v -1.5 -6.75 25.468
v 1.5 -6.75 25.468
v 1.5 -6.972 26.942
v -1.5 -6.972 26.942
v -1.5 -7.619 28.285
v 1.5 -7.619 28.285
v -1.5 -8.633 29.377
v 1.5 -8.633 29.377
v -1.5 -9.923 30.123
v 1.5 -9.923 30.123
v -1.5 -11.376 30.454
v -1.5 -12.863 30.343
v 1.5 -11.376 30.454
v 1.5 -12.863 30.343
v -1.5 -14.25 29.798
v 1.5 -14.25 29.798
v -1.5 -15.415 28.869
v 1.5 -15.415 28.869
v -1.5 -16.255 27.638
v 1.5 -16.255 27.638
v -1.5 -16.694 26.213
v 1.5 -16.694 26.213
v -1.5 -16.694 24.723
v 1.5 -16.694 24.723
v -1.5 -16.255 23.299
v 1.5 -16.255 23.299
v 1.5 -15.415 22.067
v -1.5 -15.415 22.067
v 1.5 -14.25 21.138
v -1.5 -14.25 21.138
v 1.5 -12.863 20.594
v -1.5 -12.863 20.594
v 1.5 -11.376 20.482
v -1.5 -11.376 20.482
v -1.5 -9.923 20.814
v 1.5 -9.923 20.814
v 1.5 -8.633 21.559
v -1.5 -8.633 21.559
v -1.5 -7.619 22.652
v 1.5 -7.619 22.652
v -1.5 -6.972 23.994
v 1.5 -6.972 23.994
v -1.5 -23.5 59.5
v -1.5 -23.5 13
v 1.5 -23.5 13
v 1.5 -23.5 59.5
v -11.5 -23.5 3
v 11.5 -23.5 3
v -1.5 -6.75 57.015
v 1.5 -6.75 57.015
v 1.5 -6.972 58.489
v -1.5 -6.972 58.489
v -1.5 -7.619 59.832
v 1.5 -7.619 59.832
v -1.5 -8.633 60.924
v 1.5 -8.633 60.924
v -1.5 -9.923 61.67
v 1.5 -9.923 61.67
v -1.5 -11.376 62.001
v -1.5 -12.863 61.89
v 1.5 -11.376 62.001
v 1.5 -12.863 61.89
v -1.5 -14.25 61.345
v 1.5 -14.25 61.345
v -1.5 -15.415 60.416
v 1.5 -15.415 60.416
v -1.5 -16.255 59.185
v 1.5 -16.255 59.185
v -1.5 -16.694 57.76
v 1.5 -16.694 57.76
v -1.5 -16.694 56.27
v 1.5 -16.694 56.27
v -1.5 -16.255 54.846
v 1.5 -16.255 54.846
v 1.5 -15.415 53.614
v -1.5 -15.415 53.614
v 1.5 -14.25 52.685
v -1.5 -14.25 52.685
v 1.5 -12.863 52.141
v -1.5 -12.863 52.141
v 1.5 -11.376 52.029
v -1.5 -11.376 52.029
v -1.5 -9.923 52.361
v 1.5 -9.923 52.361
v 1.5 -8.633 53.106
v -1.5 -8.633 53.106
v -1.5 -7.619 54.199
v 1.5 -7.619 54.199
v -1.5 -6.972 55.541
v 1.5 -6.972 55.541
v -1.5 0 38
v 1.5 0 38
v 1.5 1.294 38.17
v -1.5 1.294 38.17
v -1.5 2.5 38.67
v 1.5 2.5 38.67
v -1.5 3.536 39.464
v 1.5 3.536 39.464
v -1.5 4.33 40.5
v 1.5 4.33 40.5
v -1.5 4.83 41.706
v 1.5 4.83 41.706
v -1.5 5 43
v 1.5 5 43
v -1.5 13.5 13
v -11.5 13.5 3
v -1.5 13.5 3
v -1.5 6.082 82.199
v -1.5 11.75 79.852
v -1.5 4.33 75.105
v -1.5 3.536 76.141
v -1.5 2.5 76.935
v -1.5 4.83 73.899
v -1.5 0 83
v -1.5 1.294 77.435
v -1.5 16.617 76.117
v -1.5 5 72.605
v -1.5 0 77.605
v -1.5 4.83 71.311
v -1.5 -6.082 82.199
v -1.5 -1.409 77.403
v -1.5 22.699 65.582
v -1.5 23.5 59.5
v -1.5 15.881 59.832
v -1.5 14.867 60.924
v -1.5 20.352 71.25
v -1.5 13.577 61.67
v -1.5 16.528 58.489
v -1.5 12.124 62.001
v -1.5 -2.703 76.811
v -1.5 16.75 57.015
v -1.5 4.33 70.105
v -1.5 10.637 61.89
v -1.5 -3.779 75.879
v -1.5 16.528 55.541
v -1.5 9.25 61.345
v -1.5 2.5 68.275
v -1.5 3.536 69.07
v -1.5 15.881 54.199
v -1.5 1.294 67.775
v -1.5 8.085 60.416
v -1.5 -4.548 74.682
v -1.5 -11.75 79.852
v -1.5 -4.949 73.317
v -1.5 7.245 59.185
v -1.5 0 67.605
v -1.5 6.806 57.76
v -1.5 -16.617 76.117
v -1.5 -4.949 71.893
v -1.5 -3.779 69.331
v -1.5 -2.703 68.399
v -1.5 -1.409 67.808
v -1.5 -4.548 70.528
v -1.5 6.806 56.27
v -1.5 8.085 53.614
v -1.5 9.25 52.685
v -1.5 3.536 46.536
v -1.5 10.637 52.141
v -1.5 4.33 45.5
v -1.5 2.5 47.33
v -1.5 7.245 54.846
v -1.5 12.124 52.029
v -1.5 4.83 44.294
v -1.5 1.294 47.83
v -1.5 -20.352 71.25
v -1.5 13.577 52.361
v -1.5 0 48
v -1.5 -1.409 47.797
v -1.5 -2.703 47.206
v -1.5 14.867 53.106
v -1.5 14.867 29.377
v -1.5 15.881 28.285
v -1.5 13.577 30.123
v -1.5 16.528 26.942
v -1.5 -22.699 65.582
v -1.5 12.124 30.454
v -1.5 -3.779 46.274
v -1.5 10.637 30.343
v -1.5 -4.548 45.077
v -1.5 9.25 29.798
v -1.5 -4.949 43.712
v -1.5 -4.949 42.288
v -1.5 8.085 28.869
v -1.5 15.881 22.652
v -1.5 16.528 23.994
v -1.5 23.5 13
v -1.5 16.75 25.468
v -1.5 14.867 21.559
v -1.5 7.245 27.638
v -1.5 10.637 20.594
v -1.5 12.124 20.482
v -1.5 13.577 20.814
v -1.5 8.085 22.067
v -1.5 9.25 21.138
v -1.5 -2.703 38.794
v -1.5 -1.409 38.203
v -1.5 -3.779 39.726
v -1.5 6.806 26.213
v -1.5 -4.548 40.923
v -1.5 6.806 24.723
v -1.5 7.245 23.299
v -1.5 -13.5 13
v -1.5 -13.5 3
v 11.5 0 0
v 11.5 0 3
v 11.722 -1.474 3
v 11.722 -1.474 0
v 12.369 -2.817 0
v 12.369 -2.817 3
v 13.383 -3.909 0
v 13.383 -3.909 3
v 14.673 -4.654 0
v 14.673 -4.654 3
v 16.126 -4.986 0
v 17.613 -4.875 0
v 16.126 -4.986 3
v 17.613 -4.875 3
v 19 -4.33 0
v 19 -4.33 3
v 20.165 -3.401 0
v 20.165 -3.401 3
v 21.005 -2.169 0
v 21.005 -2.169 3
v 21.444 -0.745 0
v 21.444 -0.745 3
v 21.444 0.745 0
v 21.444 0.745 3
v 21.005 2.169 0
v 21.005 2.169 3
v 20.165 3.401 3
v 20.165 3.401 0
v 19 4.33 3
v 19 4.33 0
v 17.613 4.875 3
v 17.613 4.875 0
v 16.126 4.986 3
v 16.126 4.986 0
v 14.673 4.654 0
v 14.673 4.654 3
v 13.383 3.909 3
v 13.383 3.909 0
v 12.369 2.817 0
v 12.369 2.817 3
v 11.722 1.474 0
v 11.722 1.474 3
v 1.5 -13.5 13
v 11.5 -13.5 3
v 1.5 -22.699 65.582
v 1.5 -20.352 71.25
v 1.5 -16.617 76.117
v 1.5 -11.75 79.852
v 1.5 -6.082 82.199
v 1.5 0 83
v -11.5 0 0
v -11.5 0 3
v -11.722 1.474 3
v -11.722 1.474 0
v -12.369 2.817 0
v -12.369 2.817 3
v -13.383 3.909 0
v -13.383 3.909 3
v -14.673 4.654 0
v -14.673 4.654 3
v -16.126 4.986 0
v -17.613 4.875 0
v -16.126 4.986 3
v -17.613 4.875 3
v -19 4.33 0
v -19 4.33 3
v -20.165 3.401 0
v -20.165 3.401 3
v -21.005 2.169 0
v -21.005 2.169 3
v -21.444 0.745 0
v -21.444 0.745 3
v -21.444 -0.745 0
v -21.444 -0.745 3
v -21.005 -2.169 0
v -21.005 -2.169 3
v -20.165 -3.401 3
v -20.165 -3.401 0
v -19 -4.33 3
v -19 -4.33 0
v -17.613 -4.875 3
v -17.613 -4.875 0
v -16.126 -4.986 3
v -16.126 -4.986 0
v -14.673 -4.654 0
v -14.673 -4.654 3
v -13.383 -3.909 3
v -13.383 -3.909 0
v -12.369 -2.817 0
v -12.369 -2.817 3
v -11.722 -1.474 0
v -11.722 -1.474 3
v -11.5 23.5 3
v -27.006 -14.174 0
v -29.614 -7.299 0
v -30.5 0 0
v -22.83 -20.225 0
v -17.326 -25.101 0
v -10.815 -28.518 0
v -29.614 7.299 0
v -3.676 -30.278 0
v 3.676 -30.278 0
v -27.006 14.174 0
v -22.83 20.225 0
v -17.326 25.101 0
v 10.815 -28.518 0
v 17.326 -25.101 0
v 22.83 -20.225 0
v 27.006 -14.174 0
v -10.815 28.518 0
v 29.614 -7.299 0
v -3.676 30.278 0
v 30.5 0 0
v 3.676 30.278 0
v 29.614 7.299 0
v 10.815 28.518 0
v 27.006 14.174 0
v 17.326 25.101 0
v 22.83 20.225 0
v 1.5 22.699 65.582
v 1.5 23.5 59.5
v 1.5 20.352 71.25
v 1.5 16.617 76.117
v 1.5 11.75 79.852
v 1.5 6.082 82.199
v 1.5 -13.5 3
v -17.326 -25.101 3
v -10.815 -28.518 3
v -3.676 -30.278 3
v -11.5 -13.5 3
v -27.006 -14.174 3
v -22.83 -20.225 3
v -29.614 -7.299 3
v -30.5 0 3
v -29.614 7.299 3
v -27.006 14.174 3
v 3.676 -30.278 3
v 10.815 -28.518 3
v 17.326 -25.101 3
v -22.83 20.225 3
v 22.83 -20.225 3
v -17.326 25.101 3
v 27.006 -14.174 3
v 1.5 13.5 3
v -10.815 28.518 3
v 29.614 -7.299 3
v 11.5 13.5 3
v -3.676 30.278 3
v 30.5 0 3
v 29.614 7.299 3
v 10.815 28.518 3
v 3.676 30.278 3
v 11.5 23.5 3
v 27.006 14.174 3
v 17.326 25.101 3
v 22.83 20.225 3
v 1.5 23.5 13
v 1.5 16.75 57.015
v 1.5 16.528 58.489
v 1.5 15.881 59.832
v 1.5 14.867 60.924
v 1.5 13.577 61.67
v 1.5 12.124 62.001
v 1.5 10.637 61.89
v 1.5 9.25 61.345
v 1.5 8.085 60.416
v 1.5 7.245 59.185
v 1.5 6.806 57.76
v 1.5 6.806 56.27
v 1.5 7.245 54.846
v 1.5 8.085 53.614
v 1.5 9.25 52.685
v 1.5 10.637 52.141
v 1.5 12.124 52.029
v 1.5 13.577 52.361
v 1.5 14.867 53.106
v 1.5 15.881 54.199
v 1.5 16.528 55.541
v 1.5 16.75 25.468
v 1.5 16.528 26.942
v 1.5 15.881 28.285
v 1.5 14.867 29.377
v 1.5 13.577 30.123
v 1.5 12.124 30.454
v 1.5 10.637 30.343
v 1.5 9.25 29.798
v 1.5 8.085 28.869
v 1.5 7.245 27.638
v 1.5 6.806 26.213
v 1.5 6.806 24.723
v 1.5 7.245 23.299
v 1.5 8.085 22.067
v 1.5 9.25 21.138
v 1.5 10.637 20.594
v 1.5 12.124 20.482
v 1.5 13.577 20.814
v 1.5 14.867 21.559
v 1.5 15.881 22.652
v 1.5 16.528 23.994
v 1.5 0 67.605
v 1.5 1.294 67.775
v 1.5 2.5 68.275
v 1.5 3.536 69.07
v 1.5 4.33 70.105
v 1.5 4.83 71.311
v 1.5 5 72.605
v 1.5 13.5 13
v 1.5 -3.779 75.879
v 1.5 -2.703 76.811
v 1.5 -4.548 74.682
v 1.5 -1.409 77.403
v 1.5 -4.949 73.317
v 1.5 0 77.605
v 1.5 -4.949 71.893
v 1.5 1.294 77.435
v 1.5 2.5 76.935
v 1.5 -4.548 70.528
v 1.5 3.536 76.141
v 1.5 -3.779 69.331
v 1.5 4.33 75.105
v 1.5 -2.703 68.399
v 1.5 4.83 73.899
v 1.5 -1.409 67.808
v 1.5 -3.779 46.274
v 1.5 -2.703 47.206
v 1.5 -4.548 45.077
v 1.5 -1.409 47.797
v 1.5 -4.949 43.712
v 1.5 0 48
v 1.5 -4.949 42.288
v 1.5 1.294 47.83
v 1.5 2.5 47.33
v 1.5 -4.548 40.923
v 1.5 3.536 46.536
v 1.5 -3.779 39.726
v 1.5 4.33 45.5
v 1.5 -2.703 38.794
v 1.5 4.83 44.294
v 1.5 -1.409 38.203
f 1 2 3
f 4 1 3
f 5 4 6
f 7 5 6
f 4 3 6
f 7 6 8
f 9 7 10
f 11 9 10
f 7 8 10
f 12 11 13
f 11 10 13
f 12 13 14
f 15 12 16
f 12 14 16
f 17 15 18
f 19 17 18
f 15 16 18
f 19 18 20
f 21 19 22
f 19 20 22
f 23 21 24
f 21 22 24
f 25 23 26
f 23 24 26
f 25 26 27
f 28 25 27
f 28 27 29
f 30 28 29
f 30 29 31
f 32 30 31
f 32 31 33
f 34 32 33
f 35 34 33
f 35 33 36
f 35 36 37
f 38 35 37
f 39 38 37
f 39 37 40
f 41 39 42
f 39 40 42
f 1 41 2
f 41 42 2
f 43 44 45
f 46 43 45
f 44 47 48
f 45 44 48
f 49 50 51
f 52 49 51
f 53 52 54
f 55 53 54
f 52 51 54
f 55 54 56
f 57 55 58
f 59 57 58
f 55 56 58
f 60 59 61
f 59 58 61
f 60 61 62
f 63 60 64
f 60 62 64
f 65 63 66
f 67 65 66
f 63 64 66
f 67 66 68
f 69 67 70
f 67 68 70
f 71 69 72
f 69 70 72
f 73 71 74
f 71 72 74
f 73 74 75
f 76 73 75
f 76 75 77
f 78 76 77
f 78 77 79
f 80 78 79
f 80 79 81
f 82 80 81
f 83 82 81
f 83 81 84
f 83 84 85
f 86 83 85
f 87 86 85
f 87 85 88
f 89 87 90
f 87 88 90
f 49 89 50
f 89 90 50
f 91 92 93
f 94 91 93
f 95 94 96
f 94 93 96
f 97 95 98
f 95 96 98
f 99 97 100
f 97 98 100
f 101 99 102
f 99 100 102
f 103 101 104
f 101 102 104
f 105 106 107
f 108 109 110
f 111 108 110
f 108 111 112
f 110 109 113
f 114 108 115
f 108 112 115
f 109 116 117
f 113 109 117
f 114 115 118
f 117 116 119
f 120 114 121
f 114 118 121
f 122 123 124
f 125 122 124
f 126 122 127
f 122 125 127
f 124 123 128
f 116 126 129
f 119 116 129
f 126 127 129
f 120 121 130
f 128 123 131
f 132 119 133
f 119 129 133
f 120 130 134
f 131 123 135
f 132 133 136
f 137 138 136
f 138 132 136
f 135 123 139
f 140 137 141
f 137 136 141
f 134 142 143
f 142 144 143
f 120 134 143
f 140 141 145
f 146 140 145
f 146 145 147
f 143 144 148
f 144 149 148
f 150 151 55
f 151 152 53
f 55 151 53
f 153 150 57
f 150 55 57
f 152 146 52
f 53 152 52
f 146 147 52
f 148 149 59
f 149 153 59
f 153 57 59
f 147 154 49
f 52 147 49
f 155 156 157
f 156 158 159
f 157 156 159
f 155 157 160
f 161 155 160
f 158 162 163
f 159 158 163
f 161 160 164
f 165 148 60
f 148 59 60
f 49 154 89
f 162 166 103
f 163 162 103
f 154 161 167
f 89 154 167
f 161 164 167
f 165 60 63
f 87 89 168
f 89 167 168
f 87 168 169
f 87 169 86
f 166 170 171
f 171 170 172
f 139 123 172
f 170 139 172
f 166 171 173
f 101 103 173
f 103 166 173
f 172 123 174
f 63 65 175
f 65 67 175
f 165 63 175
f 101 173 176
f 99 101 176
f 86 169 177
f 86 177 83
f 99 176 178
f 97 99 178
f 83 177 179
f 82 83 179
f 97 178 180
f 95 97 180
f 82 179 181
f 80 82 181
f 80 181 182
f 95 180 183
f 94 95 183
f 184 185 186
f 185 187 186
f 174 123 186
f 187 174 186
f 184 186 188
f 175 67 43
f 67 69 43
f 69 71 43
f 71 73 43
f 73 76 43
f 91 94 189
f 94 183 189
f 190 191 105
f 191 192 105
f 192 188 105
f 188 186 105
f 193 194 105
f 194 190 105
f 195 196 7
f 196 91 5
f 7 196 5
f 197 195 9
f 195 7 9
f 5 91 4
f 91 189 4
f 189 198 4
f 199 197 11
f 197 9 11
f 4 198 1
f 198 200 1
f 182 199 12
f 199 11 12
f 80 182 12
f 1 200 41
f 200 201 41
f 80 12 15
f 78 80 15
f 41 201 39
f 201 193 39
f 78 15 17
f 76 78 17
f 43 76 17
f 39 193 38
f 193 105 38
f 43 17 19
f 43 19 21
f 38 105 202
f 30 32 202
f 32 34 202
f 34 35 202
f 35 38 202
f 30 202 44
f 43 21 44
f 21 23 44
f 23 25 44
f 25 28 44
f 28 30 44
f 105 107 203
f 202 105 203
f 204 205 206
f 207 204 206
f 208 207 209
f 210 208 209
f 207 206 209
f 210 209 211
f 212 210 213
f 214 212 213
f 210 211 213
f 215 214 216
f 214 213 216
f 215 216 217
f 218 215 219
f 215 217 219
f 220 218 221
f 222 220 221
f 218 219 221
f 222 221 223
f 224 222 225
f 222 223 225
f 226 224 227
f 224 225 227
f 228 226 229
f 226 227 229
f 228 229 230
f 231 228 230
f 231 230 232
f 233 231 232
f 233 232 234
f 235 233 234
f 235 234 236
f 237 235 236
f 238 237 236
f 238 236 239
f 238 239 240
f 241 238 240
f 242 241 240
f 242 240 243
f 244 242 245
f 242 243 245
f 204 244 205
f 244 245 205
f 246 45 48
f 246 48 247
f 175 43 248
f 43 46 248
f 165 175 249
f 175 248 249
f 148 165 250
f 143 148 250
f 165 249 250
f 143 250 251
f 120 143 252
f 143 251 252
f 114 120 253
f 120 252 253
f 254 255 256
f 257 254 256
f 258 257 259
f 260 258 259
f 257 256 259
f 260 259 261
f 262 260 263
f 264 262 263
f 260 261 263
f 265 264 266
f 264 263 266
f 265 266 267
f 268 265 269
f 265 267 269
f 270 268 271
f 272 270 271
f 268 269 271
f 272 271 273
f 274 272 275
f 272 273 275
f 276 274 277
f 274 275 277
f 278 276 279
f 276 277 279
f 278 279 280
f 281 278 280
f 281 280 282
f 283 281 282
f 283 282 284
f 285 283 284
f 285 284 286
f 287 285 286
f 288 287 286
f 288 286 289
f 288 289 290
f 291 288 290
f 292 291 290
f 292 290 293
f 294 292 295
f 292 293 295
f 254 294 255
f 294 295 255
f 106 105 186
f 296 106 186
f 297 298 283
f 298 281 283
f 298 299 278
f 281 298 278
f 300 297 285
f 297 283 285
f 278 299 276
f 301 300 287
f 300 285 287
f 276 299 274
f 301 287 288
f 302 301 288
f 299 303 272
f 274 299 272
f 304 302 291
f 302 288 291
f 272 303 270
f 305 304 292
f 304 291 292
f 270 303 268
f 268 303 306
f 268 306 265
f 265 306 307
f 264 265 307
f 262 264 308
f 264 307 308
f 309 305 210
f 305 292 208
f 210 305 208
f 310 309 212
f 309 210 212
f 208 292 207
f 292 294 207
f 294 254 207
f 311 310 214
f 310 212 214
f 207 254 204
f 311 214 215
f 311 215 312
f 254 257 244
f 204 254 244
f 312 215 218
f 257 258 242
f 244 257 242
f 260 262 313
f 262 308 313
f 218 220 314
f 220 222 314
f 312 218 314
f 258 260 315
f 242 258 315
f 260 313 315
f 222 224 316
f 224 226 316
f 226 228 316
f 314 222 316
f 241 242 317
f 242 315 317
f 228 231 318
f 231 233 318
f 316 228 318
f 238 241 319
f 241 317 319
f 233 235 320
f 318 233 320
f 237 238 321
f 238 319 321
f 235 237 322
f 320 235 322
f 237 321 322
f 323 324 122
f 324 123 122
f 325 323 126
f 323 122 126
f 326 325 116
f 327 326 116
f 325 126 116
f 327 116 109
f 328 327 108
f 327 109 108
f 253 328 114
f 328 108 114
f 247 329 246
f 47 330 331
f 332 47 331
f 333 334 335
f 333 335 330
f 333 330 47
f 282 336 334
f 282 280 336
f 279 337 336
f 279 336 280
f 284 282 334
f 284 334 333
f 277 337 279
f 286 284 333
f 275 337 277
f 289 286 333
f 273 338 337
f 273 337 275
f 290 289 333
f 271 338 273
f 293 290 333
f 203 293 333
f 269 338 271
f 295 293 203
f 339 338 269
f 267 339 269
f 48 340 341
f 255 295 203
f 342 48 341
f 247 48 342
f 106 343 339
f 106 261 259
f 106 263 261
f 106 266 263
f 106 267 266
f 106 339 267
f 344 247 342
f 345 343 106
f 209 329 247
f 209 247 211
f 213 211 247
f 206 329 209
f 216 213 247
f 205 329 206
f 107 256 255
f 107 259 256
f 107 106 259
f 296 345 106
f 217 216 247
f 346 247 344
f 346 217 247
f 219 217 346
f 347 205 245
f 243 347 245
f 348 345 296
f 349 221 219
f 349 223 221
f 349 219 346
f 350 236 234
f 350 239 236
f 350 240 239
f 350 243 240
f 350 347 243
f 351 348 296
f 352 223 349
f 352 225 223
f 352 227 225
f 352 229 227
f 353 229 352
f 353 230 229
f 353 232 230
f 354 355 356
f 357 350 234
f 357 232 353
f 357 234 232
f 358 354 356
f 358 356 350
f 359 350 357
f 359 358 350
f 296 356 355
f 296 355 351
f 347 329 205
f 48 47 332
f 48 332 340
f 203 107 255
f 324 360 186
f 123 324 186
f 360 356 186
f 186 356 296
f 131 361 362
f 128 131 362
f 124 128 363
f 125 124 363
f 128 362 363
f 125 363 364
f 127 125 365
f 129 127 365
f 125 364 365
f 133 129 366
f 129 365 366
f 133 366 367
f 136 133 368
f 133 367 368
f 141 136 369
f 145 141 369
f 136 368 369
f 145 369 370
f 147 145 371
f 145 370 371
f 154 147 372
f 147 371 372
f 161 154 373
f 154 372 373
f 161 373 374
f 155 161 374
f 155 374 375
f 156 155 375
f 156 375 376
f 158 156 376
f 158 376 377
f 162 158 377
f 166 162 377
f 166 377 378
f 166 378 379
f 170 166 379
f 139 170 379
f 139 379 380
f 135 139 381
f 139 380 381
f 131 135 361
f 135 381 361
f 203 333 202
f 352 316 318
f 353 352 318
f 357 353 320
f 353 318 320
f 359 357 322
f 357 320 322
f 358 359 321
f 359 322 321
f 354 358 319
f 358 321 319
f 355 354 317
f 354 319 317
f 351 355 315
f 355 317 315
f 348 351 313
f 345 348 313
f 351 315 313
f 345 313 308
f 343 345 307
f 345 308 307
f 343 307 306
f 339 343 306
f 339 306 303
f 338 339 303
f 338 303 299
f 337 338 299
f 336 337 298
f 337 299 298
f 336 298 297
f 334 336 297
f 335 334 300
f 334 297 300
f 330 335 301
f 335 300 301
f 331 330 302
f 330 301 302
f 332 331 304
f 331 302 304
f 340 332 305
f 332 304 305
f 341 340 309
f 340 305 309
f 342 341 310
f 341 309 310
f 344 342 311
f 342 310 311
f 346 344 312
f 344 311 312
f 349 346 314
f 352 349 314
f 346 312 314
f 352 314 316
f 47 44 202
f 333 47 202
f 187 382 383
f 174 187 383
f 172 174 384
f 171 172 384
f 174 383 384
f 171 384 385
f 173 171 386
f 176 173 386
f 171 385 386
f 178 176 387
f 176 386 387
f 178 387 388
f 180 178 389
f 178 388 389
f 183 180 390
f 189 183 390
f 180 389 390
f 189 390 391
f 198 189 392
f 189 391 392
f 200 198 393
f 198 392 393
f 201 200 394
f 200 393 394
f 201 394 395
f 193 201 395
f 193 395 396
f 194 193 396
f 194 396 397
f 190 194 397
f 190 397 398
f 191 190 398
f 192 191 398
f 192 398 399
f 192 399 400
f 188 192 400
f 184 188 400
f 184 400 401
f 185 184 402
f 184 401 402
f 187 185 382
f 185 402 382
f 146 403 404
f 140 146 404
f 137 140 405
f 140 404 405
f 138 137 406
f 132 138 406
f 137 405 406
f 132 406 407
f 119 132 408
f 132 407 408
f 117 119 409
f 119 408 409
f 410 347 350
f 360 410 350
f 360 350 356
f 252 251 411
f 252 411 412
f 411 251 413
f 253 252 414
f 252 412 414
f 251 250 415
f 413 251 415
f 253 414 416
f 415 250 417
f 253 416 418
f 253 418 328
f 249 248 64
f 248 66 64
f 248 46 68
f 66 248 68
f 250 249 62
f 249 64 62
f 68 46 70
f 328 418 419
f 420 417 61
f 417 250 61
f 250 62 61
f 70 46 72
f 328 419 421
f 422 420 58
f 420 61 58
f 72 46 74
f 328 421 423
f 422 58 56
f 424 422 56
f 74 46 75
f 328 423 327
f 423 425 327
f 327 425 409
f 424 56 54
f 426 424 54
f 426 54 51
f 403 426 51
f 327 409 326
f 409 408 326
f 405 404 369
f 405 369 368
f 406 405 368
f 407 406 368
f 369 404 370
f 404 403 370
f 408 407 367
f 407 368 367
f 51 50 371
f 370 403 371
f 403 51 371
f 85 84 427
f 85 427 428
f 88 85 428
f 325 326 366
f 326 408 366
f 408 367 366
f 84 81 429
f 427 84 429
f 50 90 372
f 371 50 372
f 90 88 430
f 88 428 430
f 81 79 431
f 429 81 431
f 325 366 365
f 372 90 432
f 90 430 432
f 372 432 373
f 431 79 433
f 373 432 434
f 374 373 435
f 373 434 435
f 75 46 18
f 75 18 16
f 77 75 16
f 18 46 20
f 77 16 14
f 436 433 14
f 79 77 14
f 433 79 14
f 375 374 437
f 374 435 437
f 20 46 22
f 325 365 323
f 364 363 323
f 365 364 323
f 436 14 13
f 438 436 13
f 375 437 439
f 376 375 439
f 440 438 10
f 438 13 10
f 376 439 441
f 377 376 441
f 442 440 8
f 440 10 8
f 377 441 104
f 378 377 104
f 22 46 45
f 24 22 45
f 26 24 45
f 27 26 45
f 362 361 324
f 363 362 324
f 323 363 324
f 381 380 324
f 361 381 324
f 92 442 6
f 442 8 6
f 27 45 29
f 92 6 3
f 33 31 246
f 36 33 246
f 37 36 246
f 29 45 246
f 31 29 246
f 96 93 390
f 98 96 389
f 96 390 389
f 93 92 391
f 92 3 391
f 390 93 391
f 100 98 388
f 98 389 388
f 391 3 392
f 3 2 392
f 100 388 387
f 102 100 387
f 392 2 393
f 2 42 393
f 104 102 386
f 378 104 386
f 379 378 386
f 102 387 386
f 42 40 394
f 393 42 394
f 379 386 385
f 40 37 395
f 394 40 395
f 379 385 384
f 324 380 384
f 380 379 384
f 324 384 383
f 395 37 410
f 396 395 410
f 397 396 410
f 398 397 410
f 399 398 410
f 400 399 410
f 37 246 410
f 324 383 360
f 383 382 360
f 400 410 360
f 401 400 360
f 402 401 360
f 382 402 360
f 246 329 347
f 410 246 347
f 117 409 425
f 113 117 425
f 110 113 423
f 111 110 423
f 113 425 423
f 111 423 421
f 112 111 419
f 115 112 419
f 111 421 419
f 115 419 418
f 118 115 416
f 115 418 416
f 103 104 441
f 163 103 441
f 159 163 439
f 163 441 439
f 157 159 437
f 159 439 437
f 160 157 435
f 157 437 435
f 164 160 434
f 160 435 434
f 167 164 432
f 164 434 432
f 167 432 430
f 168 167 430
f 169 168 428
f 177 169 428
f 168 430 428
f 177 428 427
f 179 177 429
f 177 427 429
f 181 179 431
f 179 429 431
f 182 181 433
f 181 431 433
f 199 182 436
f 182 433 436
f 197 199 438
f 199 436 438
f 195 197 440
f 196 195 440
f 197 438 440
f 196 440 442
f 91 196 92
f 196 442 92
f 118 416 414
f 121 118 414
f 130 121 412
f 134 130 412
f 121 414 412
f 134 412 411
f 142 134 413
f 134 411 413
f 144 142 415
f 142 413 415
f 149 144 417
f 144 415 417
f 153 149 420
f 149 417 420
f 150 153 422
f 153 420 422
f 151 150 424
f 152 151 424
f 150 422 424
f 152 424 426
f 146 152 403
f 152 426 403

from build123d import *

# Parameters (mm, degrees)
F0_R      = 30.5
F1_DEPTH  = 3
F3_DEPTH  = 80
F4_R      = 23.49999
F5_W      = 10
F5_H      = 10
F6_DEPTH  = 10
F7_SIZE   = 9.99999
F8_W      = 10
F8_H      = 10
F9_DEPTH  = 10
F10_SIZE  = 9.99999
F11_R     = 5
F12_DEPTH = 3
F13_R     = 5
F14_DEPTH = 3


# Not quite as in the source:
# - a fillet or chamfer is up to 0.001 mm smaller than in the source, because OpenCascade refuses the exact size


with BuildPart() as f1:
    # F0 (on Top) → F1 (new body)
    with BuildSketch(Plane.XY):
        Circle(F0_R)
    extrude(amount=F1_DEPTH)

    # F2 (on face) → F3 (join)
    with BuildSketch(Plane.XY.offset(3)):
        Polygon((1.5, 23.5), (0, 23.5), (-1.5, 23.5), (-1.5, 0), (-1.5, -23.5), (0, -23.5), (1.5, -23.5), (1.5, 0), align=None)
    extrude(amount=F3_DEPTH)

    # F4 (radius 23.5 in the source; OpenCascade refuses exactly that, so slightly less here)
    f4_edges = [f1.edges().sort_by_distance(p)[0] for p in [
        (0, 23.5, 83),
        (0, -23.5, 83),
    ]]
    fillet(f4_edges, radius=F4_R)

    # F5 (on face) → F6 (join)
    with BuildSketch(Plane.XY.offset(3)):
        with Locations((6.5, -18.5)):
            Rectangle(F5_W, F5_H)
    extrude(amount=F6_DEPTH)

    # F7 (size 10 in the source; OpenCascade refuses exactly that, so slightly less here)
    f7_edges = [f1.edges().sort_by_distance(p)[0] for p in [
        (11.5, -18.5, 13),
    ]]
    chamfer(f7_edges, length=F7_SIZE)

    # F8 (on face) → F9 (join)
    with BuildSketch(Plane.XY.offset(3)):
        with Locations((6.5, 18.5)):
            Rectangle(F8_W, F8_H)
        with Locations((-6.5, 18.5)):
            Rectangle(F8_W, F8_H)
        with Locations((-6.5, -18.5)):
            Rectangle(F8_W, F8_H)
    extrude(amount=F9_DEPTH)

    # F10 (size 10 in the source; OpenCascade refuses exactly that, so slightly less here)
    f10_edges = [f1.edges().sort_by_distance(p)[0] for p in [
        (11.5, 18.5, 13),
        (-11.5, 18.5, 13),
        (-11.5, -18.5, 13),
    ]]
    chamfer(f10_edges, length=F10_SIZE)

    # F11 (on face) → F12 (cut)
    with BuildSketch(Plane.XY.offset(3)):
        with BuildLine():
            ThreePointArc((21.5, 0), (16.5, 5), (11.5, 0))
            ThreePointArc((11.5, 0), (16.5, -5), (21.5, 0))
        make_face()
        with Locations((-16.5, 0)):
            Circle(F11_R)
    extrude(amount=-F12_DEPTH, mode=Mode.SUBTRACT)

    # F13 (on face) → F14 (cut)
    with BuildSketch(Plane.YZ.offset(1.5)):
        with BuildLine():
            ThreePointArc((0, 77.6050660014), (-5, 72.6050660014), (0, 67.6050660014))
            ThreePointArc((0, 67.6050660014), (3.5355339059, 69.0695320955), (5, 72.6050660014))
            ThreePointArc((5, 72.6050660014), (3.5355339059, 76.1405999073), (0, 77.6050660014))
        make_face()
        with Locations((11.75, 57.0152029395)):
            Circle(F13_R)
        with BuildLine():
            ThreePointArc((0, 48), (-5, 43), (0, 38))
            ThreePointArc((0, 38), (3.5355339059, 39.4644660941), (5, 43))
            ThreePointArc((5, 43), (3.5355339059, 46.5355339059), (0, 48))
        make_face()
        with Locations((-11.75, 57.0152029395)):
            Circle(F13_R)
        with Locations((-11.75, 25.4681762308)):
            Circle(F13_R)
        with Locations((11.75, 25.4681762308)):
            Circle(F13_R)
    extrude(amount=-F14_DEPTH, mode=Mode.SUBTRACT)


solid = f1.part
